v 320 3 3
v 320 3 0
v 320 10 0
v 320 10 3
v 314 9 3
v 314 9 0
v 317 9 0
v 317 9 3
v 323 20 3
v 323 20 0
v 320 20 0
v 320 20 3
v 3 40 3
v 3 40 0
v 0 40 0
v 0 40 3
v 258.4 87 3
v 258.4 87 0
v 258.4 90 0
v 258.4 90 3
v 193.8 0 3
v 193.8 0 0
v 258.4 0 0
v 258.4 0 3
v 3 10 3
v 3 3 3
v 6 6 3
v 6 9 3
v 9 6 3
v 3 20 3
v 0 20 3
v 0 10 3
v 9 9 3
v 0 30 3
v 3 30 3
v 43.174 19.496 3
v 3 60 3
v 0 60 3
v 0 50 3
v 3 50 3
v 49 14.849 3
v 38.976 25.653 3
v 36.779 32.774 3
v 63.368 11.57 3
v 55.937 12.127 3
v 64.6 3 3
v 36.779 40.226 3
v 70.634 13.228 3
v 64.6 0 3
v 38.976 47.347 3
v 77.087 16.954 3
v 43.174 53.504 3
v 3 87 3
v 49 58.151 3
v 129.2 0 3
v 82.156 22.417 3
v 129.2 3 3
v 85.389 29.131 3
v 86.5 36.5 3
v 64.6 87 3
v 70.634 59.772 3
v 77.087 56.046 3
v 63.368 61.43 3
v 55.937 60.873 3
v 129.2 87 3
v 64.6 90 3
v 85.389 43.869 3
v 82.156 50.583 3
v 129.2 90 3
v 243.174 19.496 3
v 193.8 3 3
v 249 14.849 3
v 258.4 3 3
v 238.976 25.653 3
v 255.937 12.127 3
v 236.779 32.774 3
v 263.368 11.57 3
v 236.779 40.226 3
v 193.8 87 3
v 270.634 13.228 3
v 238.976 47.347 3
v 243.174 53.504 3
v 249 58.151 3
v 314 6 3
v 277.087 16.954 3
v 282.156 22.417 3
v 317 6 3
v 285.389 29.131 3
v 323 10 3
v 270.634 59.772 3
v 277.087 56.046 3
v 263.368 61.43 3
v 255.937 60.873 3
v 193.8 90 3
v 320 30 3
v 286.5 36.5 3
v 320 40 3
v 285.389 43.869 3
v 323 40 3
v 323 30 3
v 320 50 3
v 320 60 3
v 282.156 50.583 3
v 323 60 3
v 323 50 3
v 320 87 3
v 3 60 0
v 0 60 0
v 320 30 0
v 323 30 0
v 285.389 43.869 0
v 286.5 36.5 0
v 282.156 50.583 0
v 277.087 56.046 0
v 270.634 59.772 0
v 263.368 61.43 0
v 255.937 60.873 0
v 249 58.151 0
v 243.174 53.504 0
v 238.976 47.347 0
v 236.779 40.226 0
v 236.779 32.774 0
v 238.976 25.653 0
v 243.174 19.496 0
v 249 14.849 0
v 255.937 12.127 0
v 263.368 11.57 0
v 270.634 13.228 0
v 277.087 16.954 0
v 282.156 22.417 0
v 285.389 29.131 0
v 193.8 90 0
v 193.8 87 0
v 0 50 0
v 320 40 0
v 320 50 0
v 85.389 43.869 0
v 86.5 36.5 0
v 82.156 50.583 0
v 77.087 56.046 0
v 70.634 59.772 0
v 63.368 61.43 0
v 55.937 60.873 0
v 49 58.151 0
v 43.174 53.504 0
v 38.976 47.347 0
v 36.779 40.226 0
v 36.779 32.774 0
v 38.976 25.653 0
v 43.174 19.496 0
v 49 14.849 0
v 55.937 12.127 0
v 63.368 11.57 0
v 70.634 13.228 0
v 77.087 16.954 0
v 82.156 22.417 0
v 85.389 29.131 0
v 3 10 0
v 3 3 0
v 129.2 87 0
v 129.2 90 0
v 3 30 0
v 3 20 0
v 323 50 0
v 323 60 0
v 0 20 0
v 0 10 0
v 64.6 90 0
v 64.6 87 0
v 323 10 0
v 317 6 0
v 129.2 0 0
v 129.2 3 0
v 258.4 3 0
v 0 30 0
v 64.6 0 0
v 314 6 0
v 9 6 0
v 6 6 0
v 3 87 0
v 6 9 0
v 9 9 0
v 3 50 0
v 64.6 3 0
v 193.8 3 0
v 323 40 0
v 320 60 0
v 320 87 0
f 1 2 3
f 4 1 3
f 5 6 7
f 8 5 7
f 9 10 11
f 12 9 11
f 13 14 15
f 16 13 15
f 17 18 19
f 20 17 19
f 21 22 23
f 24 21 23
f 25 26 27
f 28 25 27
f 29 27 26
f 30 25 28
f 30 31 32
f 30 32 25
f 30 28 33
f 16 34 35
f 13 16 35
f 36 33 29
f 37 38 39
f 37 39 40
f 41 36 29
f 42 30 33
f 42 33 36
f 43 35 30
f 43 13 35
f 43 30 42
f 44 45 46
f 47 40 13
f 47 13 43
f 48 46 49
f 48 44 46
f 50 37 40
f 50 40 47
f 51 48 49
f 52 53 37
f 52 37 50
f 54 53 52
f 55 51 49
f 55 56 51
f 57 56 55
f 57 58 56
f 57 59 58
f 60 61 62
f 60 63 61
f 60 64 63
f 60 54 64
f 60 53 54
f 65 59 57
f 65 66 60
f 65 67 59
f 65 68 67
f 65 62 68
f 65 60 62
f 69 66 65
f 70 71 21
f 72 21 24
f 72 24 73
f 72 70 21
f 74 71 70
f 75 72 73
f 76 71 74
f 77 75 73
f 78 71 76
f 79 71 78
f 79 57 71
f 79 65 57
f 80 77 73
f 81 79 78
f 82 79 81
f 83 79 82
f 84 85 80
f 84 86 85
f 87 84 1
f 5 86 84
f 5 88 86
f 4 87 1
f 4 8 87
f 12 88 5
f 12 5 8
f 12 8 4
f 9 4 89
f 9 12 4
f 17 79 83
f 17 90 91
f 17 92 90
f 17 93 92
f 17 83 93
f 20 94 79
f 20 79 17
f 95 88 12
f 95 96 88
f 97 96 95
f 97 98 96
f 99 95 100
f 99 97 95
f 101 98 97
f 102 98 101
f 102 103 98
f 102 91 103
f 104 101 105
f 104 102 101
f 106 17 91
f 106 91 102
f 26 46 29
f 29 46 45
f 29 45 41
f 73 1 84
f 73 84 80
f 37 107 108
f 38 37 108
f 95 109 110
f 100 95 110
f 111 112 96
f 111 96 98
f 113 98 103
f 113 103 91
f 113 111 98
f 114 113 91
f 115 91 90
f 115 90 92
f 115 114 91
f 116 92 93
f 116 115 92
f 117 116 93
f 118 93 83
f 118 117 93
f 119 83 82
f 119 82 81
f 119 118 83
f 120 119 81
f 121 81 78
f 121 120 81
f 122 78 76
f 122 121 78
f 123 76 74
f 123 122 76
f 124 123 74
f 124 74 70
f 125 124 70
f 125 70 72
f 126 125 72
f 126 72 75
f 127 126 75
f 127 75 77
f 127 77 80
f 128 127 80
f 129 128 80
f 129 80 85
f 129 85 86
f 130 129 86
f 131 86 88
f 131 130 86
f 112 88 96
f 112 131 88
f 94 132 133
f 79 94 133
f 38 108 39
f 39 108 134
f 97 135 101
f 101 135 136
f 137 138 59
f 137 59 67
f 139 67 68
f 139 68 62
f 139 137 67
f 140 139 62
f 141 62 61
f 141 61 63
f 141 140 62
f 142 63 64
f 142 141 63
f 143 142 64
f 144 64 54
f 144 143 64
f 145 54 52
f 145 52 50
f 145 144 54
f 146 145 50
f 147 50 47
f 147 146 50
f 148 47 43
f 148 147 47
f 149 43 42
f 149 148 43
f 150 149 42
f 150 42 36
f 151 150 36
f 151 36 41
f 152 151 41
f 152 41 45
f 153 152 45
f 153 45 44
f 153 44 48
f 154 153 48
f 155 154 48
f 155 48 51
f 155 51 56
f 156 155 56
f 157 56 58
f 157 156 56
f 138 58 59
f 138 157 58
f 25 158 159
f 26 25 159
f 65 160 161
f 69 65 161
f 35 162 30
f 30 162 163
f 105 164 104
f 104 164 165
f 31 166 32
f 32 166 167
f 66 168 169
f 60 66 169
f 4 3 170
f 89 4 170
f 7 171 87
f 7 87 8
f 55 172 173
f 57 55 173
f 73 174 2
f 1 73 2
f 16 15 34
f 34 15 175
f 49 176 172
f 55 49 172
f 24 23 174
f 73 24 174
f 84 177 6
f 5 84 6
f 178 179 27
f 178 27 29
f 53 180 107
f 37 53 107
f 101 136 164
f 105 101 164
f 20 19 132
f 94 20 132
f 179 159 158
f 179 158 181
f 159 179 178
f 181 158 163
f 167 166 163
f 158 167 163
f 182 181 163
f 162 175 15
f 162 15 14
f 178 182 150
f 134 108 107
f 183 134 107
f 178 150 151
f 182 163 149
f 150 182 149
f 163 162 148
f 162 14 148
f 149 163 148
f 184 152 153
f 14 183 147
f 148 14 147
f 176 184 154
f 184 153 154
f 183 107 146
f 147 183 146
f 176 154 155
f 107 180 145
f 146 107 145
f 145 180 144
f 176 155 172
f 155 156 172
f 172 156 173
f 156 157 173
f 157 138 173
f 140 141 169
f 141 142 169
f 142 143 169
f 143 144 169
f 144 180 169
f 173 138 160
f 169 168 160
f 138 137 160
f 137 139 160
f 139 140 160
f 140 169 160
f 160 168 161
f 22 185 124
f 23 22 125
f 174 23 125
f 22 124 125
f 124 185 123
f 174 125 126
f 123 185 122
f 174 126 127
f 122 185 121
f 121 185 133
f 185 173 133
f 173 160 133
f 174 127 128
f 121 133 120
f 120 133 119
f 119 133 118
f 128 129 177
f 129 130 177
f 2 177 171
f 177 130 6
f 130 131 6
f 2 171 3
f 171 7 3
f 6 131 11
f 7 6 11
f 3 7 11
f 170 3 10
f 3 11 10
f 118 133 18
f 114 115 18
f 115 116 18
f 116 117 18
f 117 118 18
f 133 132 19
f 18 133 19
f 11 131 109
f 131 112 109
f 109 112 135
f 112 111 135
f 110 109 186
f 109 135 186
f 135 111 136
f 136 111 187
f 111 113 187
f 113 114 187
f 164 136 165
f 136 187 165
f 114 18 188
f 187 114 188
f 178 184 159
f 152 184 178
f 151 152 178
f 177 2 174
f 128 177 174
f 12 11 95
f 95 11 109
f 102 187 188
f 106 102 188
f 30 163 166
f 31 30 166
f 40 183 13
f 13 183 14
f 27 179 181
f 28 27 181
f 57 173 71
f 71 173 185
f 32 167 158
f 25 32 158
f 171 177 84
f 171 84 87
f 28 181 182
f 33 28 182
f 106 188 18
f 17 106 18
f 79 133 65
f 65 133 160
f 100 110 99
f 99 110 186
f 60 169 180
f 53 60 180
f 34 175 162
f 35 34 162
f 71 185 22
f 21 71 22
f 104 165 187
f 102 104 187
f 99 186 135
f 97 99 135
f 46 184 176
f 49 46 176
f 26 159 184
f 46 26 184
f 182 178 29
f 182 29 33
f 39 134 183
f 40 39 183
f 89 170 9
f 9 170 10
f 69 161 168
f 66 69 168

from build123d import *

# Parameters (mm, degrees)
SKETCH1_R           = 25
SKETCH1_W           = 3
SKETCH1_H           = 3
BOSS_EXTRUDE1_DEPTH = 3


with BuildPart() as part:
    # Sketch1 → Boss-Extrude1 (new body)
    with BuildSketch(Plane.XY):
        Polygon((3, 87), (3, 60), (0, 60), (0, 50), (3, 50), (3, 40), (0, 40), (0, 30), (3, 30), (3, 20), (0, 20), (0, 10), (3, 10), (3, 3), (64.6, 3), (64.6, 0), (129.2, 0), (129.2, 3), (193.8, 3), (193.8, 0), (258.4, 0), (258.4, 3), (320, 3), (320, 10), (323, 10), (323, 20), (320, 20), (320, 30), (323, 30), (323, 40), (320, 40), (320, 50), (323, 50), (323, 60), (320, 60), (320, 87), (258.4, 87), (258.4, 90), (193.8, 90), (193.8, 87), (129.2, 87), (129.2, 90), (64.6, 90), (64.6, 87), align=None)
        with Locations((61.5, 36.5)):
            Circle(SKETCH1_R, mode=Mode.SUBTRACT)
        with Locations((261.5, 36.5)):
            Circle(SKETCH1_R, mode=Mode.SUBTRACT)
        with Locations((315.5, 7.5)):
            Rectangle(SKETCH1_W, SKETCH1_H, mode=Mode.SUBTRACT)
        with Locations((7.5, 7.5)):
            Rectangle(SKETCH1_W, SKETCH1_H, mode=Mode.SUBTRACT)
    extrude(amount=BOSS_EXTRUDE1_DEPTH)


solid = part.part
